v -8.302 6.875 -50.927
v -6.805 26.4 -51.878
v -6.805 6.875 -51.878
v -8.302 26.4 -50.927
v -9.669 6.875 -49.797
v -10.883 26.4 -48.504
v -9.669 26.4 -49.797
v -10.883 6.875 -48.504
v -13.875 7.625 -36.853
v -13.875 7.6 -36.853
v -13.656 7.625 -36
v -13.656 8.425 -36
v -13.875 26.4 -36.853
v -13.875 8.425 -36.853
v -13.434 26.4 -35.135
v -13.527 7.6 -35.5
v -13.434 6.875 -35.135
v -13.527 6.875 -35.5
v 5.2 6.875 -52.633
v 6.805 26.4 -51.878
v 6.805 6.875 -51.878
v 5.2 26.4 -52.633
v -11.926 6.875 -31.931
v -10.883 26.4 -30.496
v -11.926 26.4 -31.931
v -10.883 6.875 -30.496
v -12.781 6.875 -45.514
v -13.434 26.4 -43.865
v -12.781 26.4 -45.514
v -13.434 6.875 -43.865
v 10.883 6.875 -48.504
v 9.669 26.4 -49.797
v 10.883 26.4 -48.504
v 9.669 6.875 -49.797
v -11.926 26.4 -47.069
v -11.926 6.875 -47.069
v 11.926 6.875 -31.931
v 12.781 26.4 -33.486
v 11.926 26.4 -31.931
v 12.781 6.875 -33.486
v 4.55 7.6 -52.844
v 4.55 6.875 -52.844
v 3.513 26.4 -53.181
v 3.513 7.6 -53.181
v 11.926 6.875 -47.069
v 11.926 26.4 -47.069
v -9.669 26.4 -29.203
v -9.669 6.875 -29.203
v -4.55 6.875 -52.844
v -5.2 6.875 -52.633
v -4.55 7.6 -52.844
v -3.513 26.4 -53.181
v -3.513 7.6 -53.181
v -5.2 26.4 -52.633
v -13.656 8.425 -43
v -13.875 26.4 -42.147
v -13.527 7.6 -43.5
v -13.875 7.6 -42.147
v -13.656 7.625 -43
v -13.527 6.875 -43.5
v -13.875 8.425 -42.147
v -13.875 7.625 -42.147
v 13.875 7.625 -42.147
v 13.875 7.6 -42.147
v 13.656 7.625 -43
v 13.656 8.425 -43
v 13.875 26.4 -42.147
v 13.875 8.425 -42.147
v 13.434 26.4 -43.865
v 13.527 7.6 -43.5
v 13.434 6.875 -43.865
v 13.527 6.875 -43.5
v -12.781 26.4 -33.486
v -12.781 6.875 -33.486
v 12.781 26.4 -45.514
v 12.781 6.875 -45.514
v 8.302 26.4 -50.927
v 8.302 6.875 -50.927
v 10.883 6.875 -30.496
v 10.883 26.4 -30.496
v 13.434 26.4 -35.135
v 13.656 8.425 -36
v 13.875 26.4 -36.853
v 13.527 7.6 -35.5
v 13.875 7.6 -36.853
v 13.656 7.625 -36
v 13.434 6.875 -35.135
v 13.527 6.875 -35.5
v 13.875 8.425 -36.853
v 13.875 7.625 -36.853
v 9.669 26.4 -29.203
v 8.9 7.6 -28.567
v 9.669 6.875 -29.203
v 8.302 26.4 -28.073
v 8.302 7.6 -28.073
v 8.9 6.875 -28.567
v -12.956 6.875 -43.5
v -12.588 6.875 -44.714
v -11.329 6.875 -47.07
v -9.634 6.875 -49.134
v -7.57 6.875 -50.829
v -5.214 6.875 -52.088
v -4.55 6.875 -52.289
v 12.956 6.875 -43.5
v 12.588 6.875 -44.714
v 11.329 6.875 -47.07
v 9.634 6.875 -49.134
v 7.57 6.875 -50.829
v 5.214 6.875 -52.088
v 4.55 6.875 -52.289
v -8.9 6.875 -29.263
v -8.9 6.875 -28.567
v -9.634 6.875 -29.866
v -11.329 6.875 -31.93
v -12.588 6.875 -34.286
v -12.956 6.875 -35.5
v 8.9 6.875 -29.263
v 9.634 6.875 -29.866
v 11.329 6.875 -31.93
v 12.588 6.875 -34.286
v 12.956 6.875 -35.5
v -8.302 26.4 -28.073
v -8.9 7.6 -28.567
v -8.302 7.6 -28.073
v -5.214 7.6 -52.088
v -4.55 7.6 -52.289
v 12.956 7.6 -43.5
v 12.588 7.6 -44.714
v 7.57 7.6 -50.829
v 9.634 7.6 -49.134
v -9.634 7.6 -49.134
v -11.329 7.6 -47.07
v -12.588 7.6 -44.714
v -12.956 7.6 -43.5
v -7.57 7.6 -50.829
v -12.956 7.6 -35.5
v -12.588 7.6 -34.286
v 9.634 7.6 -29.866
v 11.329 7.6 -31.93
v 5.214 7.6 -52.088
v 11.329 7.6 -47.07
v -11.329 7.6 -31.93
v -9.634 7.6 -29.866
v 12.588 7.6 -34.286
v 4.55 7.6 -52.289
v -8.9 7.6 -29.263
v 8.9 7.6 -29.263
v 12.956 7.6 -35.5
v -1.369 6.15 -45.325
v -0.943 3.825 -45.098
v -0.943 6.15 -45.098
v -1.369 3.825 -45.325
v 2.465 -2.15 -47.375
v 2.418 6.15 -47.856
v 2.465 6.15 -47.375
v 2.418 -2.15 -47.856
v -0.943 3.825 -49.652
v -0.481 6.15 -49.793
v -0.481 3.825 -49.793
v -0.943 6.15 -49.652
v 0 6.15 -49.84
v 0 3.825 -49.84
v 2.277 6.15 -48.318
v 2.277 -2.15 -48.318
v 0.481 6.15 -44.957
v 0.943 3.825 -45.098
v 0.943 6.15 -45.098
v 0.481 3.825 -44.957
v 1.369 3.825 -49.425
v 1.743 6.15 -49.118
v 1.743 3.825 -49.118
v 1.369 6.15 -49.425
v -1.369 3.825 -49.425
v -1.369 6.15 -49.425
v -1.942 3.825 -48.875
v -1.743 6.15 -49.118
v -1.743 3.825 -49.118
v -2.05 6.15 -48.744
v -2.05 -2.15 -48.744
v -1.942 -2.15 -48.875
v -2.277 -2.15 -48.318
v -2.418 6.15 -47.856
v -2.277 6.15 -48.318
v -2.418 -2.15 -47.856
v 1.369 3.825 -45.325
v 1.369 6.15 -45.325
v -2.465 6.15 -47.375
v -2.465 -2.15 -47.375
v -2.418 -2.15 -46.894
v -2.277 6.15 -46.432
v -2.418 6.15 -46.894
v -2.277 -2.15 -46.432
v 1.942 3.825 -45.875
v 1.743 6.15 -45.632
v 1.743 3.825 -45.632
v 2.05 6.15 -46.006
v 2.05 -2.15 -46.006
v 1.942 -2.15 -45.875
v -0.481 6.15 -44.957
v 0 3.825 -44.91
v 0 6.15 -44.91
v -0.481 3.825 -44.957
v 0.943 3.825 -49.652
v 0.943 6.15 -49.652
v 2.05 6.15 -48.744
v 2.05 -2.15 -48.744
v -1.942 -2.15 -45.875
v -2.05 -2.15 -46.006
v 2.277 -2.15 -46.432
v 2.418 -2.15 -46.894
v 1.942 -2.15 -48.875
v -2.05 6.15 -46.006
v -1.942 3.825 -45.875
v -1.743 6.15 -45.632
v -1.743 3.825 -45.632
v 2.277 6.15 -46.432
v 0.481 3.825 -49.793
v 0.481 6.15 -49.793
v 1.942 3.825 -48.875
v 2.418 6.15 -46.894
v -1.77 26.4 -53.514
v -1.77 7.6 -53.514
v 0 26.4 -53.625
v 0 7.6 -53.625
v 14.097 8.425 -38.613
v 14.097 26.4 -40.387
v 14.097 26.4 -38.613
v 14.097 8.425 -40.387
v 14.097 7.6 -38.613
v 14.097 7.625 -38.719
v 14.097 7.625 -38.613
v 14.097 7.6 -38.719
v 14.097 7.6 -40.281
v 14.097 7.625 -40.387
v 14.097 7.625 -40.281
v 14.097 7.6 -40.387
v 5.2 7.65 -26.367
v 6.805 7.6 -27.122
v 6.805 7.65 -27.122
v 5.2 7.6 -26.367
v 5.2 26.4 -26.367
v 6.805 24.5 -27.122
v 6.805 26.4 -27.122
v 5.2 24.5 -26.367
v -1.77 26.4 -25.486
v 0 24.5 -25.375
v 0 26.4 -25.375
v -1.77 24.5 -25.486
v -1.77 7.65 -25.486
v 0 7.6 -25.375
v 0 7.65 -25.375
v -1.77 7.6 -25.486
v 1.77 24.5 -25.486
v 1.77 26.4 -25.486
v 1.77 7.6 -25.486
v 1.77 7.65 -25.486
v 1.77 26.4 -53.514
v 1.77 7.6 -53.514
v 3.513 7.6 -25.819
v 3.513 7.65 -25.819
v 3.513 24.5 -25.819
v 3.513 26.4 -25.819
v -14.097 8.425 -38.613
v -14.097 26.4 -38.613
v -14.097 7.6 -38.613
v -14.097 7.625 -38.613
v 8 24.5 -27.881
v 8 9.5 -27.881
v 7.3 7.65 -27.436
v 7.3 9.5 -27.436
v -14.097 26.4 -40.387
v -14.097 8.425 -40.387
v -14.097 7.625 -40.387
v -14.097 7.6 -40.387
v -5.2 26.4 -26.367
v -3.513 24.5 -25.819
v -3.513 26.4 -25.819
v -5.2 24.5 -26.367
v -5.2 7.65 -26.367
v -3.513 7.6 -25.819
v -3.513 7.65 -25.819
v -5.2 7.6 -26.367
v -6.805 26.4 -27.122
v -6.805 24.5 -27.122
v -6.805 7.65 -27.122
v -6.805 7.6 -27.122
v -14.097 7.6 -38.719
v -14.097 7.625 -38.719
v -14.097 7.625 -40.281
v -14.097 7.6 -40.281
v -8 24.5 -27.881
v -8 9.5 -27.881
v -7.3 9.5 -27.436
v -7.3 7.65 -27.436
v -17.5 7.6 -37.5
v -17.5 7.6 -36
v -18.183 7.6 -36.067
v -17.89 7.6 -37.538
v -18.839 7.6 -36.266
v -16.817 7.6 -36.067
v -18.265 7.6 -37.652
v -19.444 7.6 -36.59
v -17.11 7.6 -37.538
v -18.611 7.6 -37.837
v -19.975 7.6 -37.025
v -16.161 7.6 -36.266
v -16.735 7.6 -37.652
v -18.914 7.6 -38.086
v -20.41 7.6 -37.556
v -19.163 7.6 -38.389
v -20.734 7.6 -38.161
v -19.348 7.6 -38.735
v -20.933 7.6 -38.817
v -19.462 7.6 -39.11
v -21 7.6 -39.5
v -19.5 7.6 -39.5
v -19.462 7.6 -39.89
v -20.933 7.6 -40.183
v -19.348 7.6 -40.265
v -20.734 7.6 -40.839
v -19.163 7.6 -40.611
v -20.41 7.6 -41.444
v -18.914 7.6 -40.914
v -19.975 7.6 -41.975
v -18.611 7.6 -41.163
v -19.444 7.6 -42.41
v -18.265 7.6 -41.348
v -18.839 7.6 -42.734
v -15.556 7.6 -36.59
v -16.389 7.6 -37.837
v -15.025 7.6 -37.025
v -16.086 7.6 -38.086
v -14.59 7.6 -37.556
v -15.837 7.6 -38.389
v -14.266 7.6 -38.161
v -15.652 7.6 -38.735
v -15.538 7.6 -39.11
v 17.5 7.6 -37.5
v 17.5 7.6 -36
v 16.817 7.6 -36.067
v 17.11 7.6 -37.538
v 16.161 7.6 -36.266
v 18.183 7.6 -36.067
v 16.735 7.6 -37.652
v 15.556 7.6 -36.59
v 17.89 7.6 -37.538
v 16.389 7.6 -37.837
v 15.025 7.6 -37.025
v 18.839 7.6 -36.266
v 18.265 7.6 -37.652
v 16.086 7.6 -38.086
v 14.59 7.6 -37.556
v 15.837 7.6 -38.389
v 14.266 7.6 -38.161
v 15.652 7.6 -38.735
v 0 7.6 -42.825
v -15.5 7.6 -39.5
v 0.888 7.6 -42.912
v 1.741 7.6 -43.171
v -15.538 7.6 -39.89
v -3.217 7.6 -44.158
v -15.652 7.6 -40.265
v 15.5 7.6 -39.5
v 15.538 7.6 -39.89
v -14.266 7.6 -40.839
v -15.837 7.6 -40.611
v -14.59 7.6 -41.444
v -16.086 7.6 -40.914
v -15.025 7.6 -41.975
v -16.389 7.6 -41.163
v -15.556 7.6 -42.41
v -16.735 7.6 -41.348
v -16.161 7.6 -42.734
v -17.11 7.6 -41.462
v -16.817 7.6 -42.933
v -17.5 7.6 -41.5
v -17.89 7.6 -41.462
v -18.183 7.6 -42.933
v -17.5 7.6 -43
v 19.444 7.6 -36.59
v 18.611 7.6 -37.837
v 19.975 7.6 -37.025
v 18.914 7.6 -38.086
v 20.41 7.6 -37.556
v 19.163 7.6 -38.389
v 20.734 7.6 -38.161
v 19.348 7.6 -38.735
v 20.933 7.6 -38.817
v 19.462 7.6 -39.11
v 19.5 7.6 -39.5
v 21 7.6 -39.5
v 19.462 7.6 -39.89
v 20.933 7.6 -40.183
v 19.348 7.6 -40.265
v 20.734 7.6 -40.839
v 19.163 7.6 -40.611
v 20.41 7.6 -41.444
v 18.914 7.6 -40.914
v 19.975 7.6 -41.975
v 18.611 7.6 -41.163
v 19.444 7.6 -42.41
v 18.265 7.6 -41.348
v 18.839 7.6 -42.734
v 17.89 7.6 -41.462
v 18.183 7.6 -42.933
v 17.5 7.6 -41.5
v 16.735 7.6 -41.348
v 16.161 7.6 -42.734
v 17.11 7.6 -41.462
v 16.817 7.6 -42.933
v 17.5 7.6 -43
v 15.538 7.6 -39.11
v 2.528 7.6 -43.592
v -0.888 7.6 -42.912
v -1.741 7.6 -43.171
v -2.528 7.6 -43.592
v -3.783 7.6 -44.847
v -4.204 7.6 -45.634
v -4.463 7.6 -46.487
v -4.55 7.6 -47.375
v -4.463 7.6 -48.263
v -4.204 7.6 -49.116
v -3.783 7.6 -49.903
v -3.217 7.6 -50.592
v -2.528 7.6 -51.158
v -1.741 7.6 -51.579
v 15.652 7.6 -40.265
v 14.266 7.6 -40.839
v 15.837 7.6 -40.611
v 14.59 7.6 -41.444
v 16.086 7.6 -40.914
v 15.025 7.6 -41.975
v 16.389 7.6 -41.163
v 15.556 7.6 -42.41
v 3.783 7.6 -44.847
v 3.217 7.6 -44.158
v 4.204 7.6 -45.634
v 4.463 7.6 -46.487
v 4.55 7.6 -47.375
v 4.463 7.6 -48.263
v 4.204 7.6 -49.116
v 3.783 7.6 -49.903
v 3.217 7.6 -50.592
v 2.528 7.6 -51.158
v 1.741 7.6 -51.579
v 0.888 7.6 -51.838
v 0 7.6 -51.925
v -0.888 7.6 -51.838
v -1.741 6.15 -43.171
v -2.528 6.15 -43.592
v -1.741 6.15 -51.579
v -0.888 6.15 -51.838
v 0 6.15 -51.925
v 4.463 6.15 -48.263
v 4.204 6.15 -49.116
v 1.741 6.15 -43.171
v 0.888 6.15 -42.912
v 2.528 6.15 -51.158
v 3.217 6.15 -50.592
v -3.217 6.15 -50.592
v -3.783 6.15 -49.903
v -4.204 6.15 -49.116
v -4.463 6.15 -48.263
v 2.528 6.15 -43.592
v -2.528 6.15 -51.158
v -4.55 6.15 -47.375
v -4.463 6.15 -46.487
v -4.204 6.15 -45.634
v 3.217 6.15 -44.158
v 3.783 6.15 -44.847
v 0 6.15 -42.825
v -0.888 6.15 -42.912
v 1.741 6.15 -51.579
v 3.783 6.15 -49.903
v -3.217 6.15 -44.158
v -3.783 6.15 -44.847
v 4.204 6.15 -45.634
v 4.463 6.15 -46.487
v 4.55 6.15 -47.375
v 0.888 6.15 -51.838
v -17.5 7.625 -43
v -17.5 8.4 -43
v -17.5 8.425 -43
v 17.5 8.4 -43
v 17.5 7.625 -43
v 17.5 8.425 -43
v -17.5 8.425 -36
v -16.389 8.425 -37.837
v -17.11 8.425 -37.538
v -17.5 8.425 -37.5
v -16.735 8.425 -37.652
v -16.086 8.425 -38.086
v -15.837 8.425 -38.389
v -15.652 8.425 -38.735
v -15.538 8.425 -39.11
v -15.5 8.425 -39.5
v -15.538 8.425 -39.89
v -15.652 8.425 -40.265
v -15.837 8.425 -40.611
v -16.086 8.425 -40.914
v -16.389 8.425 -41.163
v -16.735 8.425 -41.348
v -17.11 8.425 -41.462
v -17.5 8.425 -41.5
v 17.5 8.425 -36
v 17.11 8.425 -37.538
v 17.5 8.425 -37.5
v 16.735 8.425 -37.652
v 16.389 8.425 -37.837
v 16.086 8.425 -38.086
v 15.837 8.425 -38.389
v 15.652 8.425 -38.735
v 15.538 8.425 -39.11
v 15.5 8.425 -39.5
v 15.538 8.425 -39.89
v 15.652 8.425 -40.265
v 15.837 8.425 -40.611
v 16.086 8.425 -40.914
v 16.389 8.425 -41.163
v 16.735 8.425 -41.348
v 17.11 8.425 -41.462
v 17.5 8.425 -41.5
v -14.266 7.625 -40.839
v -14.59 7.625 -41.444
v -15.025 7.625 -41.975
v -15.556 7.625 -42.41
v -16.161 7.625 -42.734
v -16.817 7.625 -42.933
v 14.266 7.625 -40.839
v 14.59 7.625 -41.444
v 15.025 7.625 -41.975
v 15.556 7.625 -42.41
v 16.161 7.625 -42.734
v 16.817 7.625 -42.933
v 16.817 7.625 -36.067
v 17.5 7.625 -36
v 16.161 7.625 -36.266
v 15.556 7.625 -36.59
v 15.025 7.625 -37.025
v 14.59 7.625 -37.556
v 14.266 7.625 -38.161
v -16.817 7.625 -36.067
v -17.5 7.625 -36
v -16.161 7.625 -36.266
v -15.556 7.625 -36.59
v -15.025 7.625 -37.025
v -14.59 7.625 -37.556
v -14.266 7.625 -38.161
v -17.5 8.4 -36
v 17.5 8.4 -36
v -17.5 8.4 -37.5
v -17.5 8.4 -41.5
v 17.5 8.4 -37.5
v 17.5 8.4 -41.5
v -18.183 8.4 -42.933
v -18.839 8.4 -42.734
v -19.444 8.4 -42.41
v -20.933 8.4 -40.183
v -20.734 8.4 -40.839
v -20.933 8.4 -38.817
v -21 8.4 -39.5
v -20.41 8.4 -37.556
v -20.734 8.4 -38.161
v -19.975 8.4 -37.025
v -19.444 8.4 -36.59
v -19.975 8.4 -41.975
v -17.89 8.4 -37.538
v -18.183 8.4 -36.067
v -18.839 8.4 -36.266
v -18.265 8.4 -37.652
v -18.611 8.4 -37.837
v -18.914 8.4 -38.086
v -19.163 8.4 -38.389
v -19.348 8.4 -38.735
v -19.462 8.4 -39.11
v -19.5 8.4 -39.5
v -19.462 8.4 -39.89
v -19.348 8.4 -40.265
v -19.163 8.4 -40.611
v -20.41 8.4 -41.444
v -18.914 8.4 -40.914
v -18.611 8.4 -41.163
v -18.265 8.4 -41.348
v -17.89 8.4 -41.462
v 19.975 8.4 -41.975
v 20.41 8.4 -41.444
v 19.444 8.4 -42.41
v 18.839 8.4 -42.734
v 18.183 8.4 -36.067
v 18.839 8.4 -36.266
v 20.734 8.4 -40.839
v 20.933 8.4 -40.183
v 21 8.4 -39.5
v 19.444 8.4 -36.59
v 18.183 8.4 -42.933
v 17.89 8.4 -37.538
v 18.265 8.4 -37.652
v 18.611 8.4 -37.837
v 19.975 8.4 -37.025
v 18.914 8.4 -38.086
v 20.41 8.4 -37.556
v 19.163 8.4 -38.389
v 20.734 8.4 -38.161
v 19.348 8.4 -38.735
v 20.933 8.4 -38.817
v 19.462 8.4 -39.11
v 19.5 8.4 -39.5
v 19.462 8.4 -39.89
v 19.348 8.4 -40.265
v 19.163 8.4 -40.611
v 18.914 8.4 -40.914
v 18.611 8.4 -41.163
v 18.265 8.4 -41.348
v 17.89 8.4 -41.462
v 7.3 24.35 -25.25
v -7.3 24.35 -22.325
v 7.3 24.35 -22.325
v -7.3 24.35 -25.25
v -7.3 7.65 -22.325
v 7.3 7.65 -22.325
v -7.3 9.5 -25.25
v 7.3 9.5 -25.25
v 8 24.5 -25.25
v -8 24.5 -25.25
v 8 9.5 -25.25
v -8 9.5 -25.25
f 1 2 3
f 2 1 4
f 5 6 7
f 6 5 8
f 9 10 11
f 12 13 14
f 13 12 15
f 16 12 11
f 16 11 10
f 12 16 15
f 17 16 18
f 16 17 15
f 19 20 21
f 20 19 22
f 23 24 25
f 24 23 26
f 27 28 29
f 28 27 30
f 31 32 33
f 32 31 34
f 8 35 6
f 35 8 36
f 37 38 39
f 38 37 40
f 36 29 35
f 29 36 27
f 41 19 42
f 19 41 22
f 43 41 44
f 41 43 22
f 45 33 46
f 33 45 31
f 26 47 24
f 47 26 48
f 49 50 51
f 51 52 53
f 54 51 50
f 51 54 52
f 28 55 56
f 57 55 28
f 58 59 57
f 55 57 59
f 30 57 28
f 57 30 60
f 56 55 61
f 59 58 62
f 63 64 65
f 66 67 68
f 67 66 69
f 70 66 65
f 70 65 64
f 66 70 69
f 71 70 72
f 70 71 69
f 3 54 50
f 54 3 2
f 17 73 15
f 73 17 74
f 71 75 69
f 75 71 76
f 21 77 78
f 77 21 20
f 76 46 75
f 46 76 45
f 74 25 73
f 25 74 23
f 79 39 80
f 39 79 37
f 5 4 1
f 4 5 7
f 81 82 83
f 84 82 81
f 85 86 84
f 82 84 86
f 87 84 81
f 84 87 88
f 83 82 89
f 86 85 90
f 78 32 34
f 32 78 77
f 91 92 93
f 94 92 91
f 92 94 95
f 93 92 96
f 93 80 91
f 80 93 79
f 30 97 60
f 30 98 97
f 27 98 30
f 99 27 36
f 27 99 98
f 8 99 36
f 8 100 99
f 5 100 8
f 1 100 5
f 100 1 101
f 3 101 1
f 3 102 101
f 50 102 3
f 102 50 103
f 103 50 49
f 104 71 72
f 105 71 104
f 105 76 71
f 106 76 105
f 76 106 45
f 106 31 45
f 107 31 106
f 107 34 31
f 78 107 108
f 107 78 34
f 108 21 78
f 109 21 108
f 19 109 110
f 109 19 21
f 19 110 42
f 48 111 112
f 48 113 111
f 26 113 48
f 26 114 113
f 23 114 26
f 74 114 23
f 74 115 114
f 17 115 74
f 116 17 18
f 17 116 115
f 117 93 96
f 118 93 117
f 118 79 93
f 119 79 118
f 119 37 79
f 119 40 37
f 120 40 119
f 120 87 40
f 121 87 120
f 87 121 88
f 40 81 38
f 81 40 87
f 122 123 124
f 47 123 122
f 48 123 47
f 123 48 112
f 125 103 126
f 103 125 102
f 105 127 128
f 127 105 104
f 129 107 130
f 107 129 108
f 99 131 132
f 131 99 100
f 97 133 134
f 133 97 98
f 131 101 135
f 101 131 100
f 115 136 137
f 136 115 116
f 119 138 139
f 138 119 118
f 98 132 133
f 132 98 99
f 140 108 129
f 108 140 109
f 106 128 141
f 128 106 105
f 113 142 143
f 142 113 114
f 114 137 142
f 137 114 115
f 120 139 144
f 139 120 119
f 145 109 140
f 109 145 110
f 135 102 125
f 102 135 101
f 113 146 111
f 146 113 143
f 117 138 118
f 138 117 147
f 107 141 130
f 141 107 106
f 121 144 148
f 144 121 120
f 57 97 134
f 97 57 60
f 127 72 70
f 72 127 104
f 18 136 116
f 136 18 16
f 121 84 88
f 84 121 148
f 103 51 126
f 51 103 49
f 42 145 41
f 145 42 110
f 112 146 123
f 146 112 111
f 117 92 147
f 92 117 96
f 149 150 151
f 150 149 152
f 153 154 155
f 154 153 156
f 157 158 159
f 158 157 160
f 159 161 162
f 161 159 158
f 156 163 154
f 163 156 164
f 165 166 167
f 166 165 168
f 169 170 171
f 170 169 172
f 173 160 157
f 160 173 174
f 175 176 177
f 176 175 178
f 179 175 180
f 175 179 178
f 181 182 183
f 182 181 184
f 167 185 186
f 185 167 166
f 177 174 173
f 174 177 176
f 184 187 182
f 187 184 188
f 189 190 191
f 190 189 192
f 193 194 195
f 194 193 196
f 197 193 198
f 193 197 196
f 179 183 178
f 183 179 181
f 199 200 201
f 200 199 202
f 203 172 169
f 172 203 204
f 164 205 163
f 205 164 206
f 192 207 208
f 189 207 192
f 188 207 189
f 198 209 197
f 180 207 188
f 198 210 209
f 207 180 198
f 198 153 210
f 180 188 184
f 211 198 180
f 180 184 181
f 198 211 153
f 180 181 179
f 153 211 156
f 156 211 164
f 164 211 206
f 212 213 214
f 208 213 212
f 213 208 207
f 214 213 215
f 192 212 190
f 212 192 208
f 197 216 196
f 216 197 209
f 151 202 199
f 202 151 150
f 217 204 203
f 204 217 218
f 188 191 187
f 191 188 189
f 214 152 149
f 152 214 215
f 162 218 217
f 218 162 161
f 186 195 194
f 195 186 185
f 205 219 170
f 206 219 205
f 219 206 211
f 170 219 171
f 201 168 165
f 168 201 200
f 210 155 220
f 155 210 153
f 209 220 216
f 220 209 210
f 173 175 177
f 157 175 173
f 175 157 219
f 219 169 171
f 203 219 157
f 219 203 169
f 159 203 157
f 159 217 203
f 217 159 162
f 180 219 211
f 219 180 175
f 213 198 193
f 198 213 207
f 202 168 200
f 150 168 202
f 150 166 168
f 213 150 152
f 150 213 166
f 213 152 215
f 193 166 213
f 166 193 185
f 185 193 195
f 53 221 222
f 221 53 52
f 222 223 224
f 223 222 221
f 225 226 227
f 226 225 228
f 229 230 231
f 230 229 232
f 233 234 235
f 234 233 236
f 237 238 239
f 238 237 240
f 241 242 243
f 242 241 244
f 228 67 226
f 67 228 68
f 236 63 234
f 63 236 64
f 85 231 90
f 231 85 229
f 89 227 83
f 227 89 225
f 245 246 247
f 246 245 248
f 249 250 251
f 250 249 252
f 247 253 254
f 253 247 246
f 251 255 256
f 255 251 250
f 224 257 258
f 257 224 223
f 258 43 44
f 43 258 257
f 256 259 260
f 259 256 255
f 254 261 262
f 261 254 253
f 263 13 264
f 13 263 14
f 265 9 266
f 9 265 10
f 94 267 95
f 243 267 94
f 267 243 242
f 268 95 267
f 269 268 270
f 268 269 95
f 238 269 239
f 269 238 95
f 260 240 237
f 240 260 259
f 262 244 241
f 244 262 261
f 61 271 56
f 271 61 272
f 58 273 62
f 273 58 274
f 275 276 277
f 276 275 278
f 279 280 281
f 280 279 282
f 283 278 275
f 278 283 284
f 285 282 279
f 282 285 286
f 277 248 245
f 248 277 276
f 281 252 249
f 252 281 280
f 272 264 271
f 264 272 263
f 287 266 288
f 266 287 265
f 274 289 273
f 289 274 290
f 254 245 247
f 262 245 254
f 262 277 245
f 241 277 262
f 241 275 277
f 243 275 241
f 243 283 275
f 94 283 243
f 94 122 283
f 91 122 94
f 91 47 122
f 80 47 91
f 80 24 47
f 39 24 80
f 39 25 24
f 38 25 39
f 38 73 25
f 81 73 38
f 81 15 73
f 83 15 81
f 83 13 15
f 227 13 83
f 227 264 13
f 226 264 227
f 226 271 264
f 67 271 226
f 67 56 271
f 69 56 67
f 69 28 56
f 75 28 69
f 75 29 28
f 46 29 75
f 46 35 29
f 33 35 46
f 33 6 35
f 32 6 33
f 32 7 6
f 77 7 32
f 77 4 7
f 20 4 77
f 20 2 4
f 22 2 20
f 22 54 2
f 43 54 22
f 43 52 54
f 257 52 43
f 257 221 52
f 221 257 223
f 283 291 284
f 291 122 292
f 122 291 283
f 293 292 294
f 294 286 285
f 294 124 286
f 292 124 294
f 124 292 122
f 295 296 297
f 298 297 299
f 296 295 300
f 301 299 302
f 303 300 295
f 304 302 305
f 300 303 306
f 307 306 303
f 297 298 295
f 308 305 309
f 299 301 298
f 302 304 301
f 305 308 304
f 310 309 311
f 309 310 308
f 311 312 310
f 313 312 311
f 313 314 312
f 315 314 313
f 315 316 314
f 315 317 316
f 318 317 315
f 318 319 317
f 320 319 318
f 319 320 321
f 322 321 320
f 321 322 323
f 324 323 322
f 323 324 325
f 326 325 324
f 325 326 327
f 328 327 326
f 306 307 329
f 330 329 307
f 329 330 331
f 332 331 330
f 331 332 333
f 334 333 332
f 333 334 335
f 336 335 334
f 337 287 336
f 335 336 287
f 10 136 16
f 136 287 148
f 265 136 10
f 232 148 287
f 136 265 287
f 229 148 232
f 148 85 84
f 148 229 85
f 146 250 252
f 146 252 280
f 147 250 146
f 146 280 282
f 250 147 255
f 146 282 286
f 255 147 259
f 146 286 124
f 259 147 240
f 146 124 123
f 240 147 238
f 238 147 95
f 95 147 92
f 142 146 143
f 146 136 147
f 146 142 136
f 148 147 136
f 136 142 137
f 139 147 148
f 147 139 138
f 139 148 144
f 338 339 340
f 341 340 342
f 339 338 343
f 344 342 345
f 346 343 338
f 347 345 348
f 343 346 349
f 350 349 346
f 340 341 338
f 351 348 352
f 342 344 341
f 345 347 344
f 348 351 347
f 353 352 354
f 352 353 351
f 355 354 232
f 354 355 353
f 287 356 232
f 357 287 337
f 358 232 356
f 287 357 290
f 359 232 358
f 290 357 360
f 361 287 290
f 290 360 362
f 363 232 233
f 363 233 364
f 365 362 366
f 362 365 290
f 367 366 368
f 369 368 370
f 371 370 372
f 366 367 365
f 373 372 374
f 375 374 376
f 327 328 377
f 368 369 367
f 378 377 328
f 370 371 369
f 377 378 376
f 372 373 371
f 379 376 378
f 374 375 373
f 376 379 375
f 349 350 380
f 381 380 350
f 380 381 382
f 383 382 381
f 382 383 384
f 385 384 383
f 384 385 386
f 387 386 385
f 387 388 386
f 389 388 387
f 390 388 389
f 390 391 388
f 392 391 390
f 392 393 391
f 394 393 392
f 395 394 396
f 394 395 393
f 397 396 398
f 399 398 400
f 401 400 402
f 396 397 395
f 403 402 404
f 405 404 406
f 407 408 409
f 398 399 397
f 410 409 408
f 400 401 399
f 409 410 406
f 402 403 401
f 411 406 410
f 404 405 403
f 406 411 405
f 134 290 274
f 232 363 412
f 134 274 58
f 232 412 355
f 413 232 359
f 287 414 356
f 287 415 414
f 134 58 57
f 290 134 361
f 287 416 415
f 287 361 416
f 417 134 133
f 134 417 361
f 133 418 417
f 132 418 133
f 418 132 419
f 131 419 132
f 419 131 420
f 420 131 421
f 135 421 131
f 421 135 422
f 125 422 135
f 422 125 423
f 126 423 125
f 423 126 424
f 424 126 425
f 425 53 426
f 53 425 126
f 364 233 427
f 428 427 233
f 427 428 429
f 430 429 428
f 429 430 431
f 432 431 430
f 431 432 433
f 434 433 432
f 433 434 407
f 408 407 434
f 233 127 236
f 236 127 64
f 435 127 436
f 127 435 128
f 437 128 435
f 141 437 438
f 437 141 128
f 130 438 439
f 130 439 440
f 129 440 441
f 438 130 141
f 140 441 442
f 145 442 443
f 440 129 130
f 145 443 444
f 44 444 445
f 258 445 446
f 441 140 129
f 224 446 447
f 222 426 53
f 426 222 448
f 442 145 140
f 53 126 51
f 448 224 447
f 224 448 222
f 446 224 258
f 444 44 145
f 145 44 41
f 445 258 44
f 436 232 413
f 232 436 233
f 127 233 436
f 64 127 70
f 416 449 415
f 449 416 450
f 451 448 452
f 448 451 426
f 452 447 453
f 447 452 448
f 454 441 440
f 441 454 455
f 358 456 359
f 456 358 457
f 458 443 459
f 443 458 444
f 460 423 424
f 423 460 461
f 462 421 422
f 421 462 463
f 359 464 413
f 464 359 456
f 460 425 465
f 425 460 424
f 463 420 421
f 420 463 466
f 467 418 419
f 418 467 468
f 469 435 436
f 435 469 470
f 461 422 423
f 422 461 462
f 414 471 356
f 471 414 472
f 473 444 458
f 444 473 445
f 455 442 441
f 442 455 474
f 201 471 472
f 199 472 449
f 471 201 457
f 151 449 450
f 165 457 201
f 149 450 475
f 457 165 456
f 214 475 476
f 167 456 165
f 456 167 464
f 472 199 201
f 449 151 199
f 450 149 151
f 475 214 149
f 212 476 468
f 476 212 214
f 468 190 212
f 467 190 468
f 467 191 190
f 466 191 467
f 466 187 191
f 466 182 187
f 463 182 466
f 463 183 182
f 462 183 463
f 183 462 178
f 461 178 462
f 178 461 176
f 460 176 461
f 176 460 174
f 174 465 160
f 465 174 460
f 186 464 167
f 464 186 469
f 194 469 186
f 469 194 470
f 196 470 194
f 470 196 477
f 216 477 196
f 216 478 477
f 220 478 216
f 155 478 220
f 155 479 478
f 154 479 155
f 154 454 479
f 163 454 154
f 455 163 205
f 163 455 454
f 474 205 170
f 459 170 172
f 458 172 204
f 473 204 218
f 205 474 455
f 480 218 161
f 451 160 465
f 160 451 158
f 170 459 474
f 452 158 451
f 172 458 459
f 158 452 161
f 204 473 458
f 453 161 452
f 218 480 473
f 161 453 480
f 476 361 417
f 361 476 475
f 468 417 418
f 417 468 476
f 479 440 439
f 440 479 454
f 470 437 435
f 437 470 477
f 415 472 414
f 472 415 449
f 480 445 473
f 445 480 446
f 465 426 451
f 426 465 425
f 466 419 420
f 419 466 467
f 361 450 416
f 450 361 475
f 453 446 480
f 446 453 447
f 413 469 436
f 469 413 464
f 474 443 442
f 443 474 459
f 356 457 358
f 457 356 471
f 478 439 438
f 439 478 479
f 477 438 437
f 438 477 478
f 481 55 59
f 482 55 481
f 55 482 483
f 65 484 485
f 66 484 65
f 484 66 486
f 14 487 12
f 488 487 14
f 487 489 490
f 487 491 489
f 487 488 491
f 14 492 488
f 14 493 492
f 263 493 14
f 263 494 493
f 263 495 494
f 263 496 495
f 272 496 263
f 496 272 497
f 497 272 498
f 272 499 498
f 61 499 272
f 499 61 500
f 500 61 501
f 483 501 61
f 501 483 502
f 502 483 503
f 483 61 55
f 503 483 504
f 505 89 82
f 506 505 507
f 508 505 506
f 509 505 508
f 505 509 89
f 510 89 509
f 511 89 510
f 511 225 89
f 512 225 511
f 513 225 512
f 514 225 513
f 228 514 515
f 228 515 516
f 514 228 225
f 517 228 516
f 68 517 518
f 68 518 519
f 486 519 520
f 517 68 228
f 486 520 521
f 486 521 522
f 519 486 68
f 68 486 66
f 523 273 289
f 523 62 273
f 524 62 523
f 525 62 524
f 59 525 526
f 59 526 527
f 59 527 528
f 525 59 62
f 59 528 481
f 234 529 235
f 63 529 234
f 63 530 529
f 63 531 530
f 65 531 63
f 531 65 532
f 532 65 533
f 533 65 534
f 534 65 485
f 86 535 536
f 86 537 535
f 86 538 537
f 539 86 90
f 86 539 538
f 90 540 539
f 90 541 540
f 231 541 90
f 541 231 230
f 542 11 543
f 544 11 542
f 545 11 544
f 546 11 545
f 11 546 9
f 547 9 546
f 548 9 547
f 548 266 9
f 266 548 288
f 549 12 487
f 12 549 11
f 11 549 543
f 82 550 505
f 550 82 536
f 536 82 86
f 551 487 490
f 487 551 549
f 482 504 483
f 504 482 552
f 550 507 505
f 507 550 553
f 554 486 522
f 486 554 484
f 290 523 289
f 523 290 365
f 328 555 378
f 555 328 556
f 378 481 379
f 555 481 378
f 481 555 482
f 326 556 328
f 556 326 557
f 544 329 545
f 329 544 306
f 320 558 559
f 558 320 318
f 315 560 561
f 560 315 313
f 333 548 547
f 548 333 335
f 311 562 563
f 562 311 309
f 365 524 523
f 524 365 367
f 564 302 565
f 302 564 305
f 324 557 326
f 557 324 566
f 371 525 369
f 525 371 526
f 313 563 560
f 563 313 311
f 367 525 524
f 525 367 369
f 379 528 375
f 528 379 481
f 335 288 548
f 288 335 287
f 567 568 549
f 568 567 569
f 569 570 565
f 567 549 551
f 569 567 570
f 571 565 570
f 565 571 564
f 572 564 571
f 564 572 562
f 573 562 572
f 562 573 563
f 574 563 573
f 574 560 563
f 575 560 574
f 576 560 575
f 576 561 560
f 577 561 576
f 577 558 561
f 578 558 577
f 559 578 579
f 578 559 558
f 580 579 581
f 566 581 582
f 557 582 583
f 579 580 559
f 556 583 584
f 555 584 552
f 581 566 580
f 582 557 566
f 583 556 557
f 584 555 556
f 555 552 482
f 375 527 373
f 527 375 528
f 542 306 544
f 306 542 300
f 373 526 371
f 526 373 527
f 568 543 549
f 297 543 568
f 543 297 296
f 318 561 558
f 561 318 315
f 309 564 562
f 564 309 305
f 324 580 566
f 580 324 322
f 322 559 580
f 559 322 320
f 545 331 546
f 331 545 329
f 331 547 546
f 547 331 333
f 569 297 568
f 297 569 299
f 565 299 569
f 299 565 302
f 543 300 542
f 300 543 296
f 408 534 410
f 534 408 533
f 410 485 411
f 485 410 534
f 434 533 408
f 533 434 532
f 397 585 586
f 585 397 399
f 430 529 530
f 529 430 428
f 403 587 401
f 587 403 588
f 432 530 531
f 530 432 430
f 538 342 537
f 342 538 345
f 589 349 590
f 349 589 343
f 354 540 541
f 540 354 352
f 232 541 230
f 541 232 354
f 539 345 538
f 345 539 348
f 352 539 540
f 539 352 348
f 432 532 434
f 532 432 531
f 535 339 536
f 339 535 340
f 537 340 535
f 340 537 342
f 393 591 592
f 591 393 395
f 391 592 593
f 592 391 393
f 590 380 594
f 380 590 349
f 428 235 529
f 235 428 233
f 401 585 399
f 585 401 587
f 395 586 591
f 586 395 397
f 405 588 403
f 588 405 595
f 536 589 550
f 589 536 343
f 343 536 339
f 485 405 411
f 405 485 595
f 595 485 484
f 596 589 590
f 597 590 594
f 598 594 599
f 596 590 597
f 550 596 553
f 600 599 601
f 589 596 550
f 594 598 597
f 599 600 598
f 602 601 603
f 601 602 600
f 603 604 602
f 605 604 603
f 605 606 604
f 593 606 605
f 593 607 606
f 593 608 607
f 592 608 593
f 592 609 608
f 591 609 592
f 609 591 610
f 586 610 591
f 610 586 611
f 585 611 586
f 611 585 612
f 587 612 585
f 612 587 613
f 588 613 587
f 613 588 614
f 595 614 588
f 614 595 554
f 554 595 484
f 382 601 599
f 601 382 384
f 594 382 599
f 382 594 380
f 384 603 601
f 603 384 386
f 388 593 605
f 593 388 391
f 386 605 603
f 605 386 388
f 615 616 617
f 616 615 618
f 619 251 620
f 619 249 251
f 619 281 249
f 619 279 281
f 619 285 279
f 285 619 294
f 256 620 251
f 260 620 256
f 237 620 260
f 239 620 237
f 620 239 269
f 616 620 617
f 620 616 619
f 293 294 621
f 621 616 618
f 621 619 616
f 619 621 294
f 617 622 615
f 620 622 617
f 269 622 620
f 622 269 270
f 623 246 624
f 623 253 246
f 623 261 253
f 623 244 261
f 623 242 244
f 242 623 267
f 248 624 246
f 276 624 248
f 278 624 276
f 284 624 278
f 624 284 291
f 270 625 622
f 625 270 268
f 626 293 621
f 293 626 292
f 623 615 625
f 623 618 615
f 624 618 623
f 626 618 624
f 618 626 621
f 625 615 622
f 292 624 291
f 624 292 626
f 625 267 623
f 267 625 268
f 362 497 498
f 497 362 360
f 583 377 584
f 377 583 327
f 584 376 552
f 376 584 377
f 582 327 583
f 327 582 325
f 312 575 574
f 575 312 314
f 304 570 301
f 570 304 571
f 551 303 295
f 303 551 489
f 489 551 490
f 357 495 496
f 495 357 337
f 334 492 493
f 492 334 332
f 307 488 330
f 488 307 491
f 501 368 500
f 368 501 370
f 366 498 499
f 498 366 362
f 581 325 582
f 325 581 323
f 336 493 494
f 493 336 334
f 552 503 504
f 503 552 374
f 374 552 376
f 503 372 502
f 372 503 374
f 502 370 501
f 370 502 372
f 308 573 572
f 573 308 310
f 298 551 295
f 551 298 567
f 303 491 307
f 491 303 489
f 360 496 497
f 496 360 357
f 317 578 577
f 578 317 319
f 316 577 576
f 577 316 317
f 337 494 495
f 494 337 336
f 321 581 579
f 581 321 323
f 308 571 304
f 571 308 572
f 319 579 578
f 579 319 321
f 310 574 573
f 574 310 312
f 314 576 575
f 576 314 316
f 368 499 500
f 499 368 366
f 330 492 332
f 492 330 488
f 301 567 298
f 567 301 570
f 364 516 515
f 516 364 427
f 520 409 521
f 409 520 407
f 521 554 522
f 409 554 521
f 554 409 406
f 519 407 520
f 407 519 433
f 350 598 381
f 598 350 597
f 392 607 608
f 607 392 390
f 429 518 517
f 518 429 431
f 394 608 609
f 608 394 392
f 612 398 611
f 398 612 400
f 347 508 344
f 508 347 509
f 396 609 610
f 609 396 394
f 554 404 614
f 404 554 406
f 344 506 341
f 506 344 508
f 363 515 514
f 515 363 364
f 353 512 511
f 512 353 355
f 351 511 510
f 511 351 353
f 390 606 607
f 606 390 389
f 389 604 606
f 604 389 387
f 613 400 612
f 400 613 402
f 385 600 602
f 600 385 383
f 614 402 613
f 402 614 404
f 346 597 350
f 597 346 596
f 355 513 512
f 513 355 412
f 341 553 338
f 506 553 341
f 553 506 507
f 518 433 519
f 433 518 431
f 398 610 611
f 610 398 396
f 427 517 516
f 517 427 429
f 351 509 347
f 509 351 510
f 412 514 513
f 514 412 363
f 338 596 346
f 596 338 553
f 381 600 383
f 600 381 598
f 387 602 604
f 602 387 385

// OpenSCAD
$fn=50;

translate([0,0,10])
pan1();

tilt3();

stand3();

translate([0,0,-47.5])
rotate(a=[90,0,0])
smallGear2();

!translate([0,17,-39.5])
rotate([-90,90,0])
StepMotor28BYJ();

translate([0,47.5,10])
smallGear2();

translate([0,39.6,-5])
rotate([180,0,90])
StepMotor28BYJ();

module pan1(){
difference(){
gear1();
translate([10,10,0])
cylinder(d=3,7,center=true);
translate([10,-10,0])
cylinder(d=3,7,center=true);
translate([-10,10,0])
cylinder(d=3,7,center=true);
translate([-10,-10,0])
cylinder(d=3,7,center=true);
}
translate([0,0,-1])
cylinder(d=20,5,center=true);
}
module tilt3(){
translate([-20,32,5])
cube([40,10,3]);
translate([17.5,39.5,0])
cylinder(d=4,8);
translate([-17.5,39.5,0])
cylinder(d=4,8);

difference(){
tilt2();
translate([0,0,6.5])
cylinder(d=20.2,3.1,center=true);
}
}
module tilt2(){
translate([0,0,5])
cylinder(d=80,3);
translate([0,1.5,0])
tilt1();
}
module stand3(){
difference(){
stand2();
translate([0,0,-78])
cube([40,40,40],center=true);    
}}
module smallGear2(){
difference(){
smallGear1();
cube([5.2,3.2,4],center=true);
}}
module smallGear1(){
cylinder(d=10,3,center=true);
rotate(a=[0,0,0])
cube([13,1,3],center=true);
rotate(a=[0,0,20])
cube([13,1,3],center=true);
rotate(a=[0,0,40])
cube([13,1,3],center=true);
rotate(a=[0,0,60])
cube([13,1,3],center=true);
rotate(a=[0,0,80])
cube([13,1,3],center=true);
rotate(a=[0,0,100])
cube([13,1,3],center=true);
rotate(a=[0,0,120])
cube([13,1,3],center=true);
rotate(a=[0,0,140])
cube([13,1,3],center=true);
rotate(a=[0,0,160])
cube([13,1,3],center=true);
}
module stand2(){
difference(){
stand1();
rotate(a=[90,0,0])
cylinder(d=3,21,center=true);
cube([11,4,200],center=true);
translate([0,20,-60])
cube([40,40,50],center=true);
translate([0,0,-47.5])
rotate(a=[90,0,0])
cylinder(d=6,20,center=true);
}
translate([0,3.5,-60])
difference(){
cube([40,3,50],center=true);
translate([0,0,12.5])
rotate(a=[90,0,0])
cylinder(d=15,5,center=true);
translate([0,0,-25])
cube([40,40,10],center=true);
}
translate([0,0,-58])
cylinder(d=120,2);
translate([17.5,2,-39.5])
rotate(a=[270,0,0])
cylinder(d=4,10);
translate([-17.5,2,-39.5])
rotate(a=[270,0,0])
cylinder(d=4,10);
}
module stand1(){
rotate(a=[90,0,0])
cylinder(d=9.8,10,center=true);
translate([0,0,-40])
cube([10,10,80],center=true);
}
module tilt1(){
rotate(a=[90,0,0])
difference(){
gear1();
cylinder(d=3,10,center=true);
translate([0,55,0])
cube([100,100,10],center=true);


difference(){
cylinder(d=70,7,center=true);
cube([8,100,10],center=true);
cylinder(d=9,10,center=true);
translate([0,45,0])
cube([100,100,10],center=true);
}}}
module gear1(){
cylinder(d=80,3);

rotate(a=[0,0,0])
a();
rotate(a=[0,0,30])
a();
rotate(a=[0,0,60])
a();
rotate(a=[0,0,90])
a();
rotate(a=[0,0,120])
a();
rotate(a=[0,0,150])
a();
rotate(a=[0,0,180])
a();
rotate(a=[0,0,210])
a();
rotate(a=[0,0,240])
a();
rotate(a=[0,0,270])
a();
rotate(a=[0,0,300])
a();
rotate(a=[0,0,330])
a();
}
module a(){
rotate(a=[0,0,0])
translate([39.5,-0.5,0])
cube([2,1,3]);
rotate(a=[0,0,3])
translate([39.5,-0.5,0])
cube([2,1,3]);
rotate(a=[0,0,6])
translate([39.5,-0.5,0])
cube([2,1,3]);
rotate(a=[0,0,9])
translate([39.5,-0.5,0])
cube([2,1,3]);
rotate(a=[0,0,12])
translate([39.5,-0.5,0])
cube([2,1,3]);
rotate(a=[0,0,15])
translate([39.5,-0.5,0])
cube([2,1,3]);
rotate(a=[0,0,18])
translate([39.5,-0.5,0])
cube([2,1,3]);
rotate(a=[0,0,21])
translate([39.5,-0.5,0])
cube([2,1,3]);
rotate(a=[0,0,24])
translate([39.5,-0.5,0])
cube([2,1,3]);
rotate(a=[0,0,27])
translate([39.5,-0.5,0])
cube([2,1,3]);}

{
// 28BYJ-48 from RGriffoGoes 
// at http://www.thingiverse.com/thing:204734
// named and measured dimensions, and
// added details by J.Beale 21 July 2014

MBH = 18.8;   // motor body height
MBD = 28.25;  // motor body OD
SBD = 9.1;    // shaft boss OD
SBH = 1.45;   // shaft boss height above motor body
SBO = 7.875;  // offset of shaft/boss center from motor center
SHD = 4.93;   // motor shaft OD
SHDF = 3.0;   // motor shaft diameter, across flats
SHHF = 6.0;   // motor shaft flats height, or depth in from end
SHH = 9.75;   // height of shaft above motor body 

MBFH = 0.7;   // height of body edge flange protruding above surface
MBFW = 1.0;   // width of edge flange
MBFNW = 8;    // width of notch in edge flange
MBFNW2 = 17.8;  // width of edge flange notch above wiring box

MHCC = 35.0;  // mounting hole center-to-center
MTH  = 0.8;   // mounting tab thickness
MTW  = 7.0;   // mounting tab width
WBH  = 16.7;  // plastic wiring box height
WBW  = 14.6;  // plastic wiring box width
WBD  = 31.3;  // body diameter to outer surface of wiring box

WRD = 1.0;     // diameter of electrical wires
WRL = 30;      // length of electrical wires
WRO = 2.2;		// offset of wires below top motor surface

// =========================================================
eps = 0.05;   // small number to avoid coincident faces

}
module wires() {
 
  color([0.9,0.9,0]) translate([0,WRD*2,0]) cylinder(h=WRL,r=WRD/2, $fn = 7);
  color([.9,.45,0]) translate([0,WRD*1,0]) cylinder(h=WRL,r=WRD/2, $fn = 7);   
  color([1,0,0]) translate([0,0,0]) cylinder(h=WRL,r=WRD/2, $fn = 7);
  color([1,.6,.6]) translate([0,-WRD*1,0]) cylinder(h=WRL,r=WRD/2, $fn = 7);
  color([.2,.2,1]) translate([0,-WRD*2,0]) cylinder(h=WRL,r=WRD/2, $fn = 7);
}

module StepMotor28BYJ(){
  difference(){
    union(){
	   color("gray") translate([0,0,-(MBH+MBFH)/2])
		  difference() {  // flange at top rim
         cylinder(h = MBFH+eps, r = MBD/2, center = true, $fn = 50);
         cylinder(h = MBFH+2*eps, r = (MBD-MBFW)/2, center = true, $fn = 32);
			cube([MBFNW,MHCC,MBFH*2],center=true); // notches in rim
			cube([MBD+2*MBFW,SBD,MBFH*2],center=true);
		   translate([-MBD/2,0,0]) cube([MBD,MBFNW2,MBFH*2],center=true);
        }
		color("gray") // motor body
			cylinder(h = MBH, r = MBD/2, center = true, $fn = 50);
		color("gray") translate([SBO,0,-SBH])	// shaft boss
			cylinder(h = MBH, r = SBD/2, center = true, $fn = 32);

		translate([SBO,0,-SHH])	// motor shaft
        difference() {
			color("gold") cylinder(h = MBH, r = SHD/2, center = true, $fn = 32);
				// shaft flats
		   color("red") translate([(SHD+SHDF)/2,0,-(eps+MBH-SHHF)/2]) 
				cube([SHD,SHD,SHHF], center = true);
		   color("red") translate([-(SHD+SHDF)/2,0,-(eps+MBH-SHHF)/2]) 
				cube([SHD,SHD,SHHF], center = true);
        }


		color("Silver") translate([0,0,-(MBH-MTH-eps)/2]) // mounting tab 
			cube([MTW,MHCC,MTH], center = true);				
		color("Silver") translate([0,MHCC/2,-(MBH-MTH)/2]) // mt.tab rounded end
			cylinder(h = MTH, r = MTW/2, center = true, $fn = 32);
		color("Silver") translate([0,-MHCC/2,-(MBH-MTH)/2]) // mt.tab rounded end
			cylinder(h = MTH, r = MTW/2, center = true, $fn = 32);


		color("blue") translate([-(WBD-MBD),0,eps-(MBH-WBH)/2]) // plastic wire box
			cube([MBD,WBW,WBH], center = true);
	   color("blue") translate([-2,0,0])	
			cube([24.5,16,15], center = true);
		}

				// mounting holes in tabs on side
		color("red") translate([0,MHCC/2,-MBH/2])	
				cylinder(h = 2, r = 2, center = true, $fn = 32);
		color("red") translate([0,-MHCC/2,-MBH/2])	
				cylinder(h = 2, r = 2, center = true, $fn = 32);
		}
	}
